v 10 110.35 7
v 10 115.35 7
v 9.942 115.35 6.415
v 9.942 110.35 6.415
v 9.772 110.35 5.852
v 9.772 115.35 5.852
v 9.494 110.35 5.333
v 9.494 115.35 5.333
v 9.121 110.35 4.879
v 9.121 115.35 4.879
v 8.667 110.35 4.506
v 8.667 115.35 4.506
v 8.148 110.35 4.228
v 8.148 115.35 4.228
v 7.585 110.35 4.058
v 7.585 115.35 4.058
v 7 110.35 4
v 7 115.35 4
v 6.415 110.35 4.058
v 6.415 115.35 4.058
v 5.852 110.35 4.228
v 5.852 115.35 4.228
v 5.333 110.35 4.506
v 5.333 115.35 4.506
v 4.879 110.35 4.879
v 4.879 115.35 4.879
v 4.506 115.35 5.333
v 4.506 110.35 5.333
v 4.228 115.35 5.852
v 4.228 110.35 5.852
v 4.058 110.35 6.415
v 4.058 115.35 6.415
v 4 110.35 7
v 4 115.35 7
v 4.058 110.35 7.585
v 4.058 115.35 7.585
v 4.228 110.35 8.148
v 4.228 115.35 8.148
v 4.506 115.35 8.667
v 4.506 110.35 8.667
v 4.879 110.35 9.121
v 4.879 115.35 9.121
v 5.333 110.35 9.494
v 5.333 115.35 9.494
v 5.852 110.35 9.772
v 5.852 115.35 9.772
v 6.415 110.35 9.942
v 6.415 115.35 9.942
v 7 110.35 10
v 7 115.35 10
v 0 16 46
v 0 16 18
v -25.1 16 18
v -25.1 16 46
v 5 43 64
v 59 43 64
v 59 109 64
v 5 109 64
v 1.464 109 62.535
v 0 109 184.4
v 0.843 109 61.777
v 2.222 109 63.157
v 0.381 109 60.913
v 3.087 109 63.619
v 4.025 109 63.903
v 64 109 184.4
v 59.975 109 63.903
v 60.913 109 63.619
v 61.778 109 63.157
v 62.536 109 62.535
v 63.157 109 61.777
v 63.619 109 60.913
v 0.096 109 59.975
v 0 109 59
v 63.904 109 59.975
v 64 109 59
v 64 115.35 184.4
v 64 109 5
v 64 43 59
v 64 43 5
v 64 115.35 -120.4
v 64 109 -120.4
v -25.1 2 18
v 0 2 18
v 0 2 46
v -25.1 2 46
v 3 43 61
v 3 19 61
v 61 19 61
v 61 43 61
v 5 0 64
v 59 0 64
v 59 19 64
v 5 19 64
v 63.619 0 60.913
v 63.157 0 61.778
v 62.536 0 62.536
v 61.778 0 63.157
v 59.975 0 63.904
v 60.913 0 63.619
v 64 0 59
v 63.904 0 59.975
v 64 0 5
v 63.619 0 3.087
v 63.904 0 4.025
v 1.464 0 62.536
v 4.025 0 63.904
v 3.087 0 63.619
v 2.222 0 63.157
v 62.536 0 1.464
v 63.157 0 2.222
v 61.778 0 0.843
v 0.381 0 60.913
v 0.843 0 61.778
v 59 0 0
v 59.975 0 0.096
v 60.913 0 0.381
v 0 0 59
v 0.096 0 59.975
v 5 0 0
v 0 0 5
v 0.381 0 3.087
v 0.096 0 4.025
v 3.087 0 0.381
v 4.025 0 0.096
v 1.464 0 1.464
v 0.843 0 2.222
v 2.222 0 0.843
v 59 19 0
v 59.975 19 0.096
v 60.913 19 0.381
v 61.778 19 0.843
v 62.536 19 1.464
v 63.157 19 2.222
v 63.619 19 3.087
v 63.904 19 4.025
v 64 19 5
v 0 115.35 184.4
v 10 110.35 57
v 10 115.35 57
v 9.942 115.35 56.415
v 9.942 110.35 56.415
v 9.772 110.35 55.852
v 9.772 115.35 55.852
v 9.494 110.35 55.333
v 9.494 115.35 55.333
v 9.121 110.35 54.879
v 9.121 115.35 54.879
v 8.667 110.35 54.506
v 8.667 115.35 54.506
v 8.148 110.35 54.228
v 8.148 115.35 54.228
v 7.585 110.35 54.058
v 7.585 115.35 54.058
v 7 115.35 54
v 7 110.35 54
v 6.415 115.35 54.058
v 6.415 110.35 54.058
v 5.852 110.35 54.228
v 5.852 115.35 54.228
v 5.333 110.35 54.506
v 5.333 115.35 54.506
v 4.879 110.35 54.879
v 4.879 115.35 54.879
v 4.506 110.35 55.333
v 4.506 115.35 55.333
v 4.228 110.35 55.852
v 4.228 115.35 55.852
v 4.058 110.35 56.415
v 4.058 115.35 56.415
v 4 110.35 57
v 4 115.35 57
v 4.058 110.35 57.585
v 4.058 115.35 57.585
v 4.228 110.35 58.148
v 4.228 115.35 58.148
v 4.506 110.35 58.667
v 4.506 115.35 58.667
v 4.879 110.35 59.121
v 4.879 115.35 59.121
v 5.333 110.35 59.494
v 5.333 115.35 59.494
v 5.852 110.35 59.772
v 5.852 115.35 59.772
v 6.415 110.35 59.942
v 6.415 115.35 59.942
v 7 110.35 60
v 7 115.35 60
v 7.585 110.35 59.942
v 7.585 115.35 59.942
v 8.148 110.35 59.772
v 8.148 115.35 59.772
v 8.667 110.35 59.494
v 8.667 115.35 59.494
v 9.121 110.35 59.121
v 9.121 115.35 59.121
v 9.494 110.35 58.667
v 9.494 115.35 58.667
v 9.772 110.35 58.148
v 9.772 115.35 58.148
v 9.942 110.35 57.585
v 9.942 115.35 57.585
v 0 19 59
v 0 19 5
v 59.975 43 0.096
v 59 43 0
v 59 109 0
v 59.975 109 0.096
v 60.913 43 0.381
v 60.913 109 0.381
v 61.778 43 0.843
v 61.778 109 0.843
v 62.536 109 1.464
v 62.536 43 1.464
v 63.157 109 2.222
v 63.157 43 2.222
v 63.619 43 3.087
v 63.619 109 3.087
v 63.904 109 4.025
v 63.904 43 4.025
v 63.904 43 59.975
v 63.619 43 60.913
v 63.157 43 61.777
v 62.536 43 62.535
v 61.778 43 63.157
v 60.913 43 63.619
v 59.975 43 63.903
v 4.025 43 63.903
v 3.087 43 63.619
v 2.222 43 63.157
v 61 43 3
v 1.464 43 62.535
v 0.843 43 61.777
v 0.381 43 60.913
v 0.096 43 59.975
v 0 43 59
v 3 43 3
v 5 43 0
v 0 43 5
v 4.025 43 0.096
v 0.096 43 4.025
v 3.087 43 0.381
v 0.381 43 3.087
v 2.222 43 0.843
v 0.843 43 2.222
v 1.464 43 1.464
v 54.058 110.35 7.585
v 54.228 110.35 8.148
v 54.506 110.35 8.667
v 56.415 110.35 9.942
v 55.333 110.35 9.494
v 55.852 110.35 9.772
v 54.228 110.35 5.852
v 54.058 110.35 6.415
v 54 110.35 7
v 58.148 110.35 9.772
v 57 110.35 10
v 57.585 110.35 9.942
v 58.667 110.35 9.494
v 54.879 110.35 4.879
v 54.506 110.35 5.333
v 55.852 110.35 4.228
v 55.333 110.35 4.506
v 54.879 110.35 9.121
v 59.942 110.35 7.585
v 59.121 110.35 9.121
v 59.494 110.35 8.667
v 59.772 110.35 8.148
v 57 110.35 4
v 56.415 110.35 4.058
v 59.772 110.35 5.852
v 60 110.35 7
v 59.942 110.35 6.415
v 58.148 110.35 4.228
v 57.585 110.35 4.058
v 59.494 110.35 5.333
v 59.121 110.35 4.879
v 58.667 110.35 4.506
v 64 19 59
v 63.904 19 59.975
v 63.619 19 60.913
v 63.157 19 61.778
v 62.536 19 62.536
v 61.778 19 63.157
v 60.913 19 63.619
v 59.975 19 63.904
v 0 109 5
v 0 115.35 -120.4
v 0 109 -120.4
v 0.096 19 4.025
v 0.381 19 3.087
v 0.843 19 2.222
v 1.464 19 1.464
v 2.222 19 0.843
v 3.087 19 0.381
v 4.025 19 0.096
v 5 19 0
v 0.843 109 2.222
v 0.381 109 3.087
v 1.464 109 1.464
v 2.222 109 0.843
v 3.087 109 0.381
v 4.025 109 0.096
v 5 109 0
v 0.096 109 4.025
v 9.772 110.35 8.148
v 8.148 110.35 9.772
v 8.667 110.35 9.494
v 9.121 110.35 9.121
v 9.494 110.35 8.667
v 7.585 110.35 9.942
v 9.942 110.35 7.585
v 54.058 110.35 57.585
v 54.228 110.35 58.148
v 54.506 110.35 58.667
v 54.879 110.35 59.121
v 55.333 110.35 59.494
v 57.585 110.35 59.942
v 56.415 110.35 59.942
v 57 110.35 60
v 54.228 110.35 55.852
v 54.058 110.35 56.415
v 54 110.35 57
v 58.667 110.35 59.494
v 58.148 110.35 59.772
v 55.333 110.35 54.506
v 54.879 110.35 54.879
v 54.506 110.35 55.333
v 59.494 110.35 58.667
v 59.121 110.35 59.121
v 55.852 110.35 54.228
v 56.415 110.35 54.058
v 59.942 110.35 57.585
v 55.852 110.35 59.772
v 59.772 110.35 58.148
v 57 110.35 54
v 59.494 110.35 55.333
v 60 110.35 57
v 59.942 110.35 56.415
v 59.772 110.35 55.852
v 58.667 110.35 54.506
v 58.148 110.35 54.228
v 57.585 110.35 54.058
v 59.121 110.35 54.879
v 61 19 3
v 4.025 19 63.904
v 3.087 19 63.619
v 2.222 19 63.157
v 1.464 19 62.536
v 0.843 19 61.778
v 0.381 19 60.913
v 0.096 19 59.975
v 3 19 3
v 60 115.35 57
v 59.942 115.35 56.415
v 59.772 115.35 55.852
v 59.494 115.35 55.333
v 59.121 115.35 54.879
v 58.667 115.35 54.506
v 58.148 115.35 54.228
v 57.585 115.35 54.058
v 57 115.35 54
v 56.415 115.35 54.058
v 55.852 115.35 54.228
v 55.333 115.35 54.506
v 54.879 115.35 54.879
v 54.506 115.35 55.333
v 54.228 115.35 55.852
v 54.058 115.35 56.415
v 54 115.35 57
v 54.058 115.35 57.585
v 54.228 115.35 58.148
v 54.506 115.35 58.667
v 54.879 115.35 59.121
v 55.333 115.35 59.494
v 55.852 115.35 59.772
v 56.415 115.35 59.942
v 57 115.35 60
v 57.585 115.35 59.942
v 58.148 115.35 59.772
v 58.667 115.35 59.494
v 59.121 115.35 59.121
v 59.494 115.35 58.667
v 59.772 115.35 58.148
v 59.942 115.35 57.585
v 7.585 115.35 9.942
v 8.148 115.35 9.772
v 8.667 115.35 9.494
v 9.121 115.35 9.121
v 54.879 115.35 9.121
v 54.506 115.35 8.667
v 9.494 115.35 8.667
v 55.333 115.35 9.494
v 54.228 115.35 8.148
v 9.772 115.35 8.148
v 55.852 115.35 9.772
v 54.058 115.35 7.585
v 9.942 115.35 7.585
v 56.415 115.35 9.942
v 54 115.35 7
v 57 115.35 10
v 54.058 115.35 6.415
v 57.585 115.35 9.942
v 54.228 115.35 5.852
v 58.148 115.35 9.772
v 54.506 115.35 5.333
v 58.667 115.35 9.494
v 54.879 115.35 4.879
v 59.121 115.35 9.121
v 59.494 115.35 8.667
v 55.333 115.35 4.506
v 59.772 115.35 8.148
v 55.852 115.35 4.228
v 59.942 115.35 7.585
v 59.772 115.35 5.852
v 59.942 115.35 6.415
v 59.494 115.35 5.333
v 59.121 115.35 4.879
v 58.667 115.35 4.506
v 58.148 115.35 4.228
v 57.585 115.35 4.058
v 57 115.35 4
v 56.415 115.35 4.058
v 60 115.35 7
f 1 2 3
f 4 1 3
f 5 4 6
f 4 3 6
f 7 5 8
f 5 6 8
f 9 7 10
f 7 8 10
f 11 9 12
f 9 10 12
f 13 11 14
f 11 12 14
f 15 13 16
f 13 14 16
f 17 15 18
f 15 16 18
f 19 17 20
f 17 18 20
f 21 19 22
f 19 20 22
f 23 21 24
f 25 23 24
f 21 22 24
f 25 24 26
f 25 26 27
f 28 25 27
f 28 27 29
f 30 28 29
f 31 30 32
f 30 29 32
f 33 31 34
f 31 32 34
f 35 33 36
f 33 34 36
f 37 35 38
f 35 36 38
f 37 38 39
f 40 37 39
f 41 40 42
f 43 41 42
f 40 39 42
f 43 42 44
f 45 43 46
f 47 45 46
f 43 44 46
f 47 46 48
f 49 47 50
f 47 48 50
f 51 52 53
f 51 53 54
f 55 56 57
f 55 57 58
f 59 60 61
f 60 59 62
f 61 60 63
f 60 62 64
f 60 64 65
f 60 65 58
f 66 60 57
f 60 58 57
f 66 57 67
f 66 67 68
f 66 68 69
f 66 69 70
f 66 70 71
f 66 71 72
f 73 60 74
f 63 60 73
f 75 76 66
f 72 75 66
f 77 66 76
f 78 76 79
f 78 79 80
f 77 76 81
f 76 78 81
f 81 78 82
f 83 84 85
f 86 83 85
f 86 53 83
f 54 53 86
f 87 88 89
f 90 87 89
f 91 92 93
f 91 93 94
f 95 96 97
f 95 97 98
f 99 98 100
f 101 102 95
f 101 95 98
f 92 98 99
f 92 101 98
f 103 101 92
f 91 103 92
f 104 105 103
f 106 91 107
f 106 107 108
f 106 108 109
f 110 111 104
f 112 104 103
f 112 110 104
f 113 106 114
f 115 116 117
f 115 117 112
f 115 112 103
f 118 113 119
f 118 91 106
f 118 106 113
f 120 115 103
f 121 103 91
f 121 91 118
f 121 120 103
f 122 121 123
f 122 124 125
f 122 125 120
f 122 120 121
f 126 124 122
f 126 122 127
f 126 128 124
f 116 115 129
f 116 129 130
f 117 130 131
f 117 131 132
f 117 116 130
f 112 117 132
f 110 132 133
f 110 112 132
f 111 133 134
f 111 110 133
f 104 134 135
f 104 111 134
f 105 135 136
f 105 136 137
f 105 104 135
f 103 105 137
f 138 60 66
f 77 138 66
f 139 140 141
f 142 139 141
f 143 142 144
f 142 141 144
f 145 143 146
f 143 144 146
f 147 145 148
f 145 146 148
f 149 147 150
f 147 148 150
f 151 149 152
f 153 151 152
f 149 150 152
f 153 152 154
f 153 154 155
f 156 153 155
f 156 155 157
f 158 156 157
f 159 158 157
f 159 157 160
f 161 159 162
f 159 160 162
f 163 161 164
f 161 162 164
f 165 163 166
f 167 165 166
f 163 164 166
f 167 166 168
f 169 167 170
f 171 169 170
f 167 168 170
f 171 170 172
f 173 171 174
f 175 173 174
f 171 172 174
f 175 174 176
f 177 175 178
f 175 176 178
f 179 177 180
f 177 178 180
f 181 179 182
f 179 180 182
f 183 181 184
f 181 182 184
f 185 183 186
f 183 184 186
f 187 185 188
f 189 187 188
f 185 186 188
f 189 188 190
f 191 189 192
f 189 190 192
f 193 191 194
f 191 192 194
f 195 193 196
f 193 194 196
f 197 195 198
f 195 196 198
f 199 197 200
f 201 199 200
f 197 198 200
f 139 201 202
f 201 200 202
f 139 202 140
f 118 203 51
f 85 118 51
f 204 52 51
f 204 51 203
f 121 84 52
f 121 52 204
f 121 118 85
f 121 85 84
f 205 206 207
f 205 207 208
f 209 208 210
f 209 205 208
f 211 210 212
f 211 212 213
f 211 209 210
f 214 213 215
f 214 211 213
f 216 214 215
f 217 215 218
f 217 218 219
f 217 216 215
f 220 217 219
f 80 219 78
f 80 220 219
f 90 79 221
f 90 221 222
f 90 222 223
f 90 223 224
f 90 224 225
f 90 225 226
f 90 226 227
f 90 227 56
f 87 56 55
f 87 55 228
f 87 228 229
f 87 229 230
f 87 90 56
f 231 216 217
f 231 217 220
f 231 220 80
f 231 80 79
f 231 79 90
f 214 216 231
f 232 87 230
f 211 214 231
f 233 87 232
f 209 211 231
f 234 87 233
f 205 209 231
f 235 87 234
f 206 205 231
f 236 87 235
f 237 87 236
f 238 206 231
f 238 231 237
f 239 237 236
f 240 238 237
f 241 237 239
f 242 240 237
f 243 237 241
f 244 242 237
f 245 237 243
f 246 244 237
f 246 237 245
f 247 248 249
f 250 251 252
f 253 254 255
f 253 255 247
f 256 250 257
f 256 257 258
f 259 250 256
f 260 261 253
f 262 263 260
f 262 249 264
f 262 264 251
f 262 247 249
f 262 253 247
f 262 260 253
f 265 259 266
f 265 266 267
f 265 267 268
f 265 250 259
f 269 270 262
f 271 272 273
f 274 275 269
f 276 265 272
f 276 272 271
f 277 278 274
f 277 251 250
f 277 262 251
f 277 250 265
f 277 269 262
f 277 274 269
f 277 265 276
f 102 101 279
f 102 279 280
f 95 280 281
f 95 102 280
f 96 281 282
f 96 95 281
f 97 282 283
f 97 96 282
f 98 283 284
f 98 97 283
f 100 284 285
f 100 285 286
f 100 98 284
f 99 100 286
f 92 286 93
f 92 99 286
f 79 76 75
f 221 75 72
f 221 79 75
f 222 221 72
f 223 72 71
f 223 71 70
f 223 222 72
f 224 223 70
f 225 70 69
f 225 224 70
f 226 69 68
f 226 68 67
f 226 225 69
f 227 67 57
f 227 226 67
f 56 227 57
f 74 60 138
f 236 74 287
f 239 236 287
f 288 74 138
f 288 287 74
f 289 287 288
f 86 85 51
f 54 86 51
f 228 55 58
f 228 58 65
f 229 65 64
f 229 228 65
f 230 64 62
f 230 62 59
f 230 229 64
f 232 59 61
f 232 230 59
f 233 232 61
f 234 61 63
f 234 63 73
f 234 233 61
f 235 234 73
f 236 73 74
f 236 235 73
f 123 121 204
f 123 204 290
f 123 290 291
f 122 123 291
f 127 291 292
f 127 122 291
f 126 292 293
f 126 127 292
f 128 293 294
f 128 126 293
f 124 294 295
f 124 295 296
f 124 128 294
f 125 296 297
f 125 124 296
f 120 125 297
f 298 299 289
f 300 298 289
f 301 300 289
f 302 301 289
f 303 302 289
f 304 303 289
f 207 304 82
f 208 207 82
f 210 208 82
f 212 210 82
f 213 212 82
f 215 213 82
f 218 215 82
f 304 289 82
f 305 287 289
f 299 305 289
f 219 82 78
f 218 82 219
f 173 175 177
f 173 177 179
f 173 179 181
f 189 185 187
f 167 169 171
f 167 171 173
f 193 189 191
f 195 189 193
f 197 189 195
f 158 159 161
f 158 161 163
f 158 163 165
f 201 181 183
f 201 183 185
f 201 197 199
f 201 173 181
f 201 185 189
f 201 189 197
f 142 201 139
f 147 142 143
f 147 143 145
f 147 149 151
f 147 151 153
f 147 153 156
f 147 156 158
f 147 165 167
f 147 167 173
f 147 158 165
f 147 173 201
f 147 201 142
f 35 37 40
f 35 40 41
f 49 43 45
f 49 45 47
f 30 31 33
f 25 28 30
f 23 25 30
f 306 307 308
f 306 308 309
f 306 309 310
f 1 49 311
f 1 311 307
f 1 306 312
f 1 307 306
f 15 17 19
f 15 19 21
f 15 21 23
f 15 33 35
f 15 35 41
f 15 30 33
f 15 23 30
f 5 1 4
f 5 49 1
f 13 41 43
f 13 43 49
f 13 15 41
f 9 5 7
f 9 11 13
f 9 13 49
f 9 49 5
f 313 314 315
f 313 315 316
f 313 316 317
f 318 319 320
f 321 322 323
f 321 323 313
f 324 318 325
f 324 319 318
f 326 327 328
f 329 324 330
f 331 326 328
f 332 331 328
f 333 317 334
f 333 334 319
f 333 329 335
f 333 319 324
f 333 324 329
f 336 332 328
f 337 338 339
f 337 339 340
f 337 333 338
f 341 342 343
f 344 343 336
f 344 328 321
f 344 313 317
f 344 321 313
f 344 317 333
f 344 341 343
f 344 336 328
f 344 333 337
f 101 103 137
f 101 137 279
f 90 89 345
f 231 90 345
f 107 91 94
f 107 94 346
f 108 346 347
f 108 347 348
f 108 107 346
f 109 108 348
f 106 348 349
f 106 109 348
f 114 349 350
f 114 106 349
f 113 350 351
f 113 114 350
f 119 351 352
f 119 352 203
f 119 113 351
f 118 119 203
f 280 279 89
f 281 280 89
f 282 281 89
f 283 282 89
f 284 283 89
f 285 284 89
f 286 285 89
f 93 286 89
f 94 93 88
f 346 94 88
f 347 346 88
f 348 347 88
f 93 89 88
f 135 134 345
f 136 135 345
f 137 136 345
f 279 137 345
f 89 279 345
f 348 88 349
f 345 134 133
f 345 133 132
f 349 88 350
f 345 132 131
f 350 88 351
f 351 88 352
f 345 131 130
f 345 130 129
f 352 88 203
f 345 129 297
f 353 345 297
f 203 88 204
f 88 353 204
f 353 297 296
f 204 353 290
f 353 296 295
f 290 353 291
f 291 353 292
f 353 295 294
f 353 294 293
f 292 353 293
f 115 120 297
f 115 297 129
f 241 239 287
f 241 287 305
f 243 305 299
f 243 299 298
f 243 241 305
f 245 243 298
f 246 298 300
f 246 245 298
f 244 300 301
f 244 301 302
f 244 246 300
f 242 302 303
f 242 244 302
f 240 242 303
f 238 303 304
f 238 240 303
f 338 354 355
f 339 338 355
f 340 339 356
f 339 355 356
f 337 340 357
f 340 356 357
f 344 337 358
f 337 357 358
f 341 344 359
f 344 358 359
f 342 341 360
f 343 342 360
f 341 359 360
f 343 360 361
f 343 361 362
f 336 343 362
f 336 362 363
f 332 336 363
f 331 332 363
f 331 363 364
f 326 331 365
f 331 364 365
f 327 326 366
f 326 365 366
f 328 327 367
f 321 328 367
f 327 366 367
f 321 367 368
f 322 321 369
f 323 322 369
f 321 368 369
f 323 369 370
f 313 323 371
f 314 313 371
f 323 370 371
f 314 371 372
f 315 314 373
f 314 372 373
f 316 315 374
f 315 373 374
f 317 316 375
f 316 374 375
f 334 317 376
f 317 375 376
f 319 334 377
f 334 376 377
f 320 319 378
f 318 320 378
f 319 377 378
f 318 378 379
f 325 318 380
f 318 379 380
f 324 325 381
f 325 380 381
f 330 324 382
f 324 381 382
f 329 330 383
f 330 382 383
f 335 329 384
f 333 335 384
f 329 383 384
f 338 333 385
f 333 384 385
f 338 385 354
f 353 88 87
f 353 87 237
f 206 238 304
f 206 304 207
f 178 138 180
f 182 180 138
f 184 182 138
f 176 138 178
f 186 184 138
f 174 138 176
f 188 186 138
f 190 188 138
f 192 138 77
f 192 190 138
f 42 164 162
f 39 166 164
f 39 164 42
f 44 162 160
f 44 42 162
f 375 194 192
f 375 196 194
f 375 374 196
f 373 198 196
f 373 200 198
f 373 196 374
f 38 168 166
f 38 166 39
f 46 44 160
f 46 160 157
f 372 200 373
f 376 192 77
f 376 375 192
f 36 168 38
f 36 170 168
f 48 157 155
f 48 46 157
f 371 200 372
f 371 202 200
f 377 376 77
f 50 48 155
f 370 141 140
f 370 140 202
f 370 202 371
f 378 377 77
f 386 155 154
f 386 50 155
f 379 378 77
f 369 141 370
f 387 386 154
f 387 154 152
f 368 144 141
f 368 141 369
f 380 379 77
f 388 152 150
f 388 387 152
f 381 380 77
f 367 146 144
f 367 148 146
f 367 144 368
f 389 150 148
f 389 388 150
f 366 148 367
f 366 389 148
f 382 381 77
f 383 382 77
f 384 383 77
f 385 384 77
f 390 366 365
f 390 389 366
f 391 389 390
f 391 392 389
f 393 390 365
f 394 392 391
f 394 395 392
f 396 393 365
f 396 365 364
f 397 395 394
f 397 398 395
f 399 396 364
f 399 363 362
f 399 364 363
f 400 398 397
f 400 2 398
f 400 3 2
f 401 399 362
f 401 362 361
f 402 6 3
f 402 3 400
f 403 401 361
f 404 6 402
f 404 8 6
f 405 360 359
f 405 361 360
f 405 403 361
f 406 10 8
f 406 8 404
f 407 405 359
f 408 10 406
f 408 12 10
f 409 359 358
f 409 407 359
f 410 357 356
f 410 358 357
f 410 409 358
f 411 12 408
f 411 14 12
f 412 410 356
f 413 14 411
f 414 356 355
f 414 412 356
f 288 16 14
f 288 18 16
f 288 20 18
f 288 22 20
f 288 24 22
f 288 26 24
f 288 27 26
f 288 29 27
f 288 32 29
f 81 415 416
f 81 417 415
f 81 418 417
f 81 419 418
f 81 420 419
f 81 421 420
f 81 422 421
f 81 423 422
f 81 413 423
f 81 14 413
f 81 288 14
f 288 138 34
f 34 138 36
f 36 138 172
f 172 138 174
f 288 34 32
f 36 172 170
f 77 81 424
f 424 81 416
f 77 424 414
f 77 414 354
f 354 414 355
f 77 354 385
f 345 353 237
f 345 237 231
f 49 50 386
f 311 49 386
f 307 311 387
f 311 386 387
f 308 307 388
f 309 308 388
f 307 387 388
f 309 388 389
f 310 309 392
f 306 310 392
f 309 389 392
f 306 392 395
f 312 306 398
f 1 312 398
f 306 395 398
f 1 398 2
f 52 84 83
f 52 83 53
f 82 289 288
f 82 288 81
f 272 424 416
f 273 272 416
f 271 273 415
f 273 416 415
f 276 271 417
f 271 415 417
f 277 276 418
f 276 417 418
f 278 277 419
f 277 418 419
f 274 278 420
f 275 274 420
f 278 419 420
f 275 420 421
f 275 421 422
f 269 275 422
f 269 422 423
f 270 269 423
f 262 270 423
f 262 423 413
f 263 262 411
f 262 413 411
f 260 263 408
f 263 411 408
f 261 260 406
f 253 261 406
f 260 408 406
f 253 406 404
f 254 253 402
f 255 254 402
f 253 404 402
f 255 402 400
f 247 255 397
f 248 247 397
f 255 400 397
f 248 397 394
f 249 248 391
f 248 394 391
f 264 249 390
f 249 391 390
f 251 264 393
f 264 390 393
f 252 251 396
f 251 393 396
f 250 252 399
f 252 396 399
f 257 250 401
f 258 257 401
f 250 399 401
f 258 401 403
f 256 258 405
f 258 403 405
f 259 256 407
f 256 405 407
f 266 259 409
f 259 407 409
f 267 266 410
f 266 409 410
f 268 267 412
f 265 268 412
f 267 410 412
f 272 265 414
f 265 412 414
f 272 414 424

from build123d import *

# Parameters (mm, degrees)
BOSS_EXTRUDE1_DEPTH = 19
SKETCH3_W           = 58
SKETCH3_H           = 58
BOSS_EXTRUDE2_DEPTH = 24
BOSS_EXTRUDE3_DEPTH = 66
SKETCH6_W           = 28
SKETCH6_H           = 14
BOSS_EXTRUDE4_DEPTH = 25.1
SKETCH7_W           = 64
SKETCH7_H           = 304.8
BOSS_EXTRUDE5_DEPTH = 6.35
SKETCH8_R           = 3
CUT_EXTRUDE1_DEPTH  = 5


with BuildPart() as part:
    # Sketch2 → Boss-Extrude1 (new body)
    with BuildSketch(Plane(origin=(0, 0, 0), x_dir=(1, 0, 0), z_dir=(0, 1, 0))):
        with BuildLine():
            Line((5, 0), (59, 0))
            ThreePointArc((59, 0), (62.535533906, -1.464466094), (64, -5))
            Line((64, -5), (64, -59))
            ThreePointArc((64, -59), (62.535533906, -62.535533906), (59, -64))
            Line((59, -64), (5, -64))
            ThreePointArc((5, -64), (1.464466094, -62.535533906), (0, -59))
            Line((0, -59), (0, -5))
            ThreePointArc((0, -5), (1.464466094, -1.464466094), (5, 0))
        make_face()
    extrude(amount=BOSS_EXTRUDE1_DEPTH)

    # Sketch3 → Boss-Extrude2 (add)
    with BuildSketch(Plane(origin=(0, 19, 0), x_dir=(1, 0, 0), z_dir=(0, 1, 0))):
        with Locations((32, -32)):
            Rectangle(SKETCH3_W, SKETCH3_H)
    extrude(amount=BOSS_EXTRUDE2_DEPTH)

    # Sketch4 → Boss-Extrude3 (add)
    with BuildSketch(Plane(origin=(0, 43, 0), x_dir=(1, 0, 0), z_dir=(0, 1, 0))):
        with BuildLine():
            Line((5, 0), (59, 0))
            ThreePointArc((59, 0), (62.535533906, -1.464466094), (64, -5))
            Line((64, -5), (64, -58.999541839))
            ThreePointArc((64, -58.999541839), (62.535533906, -62.535075745), (59, -63.999541839))
            Line((59, -63.999541839), (5, -63.999541839))
            ThreePointArc((5, -63.999541839), (1.464466094, -62.535075745), (0, -58.999541839))
            Line((0, -58.999541839), (0, -5))
            ThreePointArc((0, -5), (1.464466094, -1.464466094), (5, 0))
        make_face()
    extrude(amount=BOSS_EXTRUDE3_DEPTH)

    # Sketch6 → Boss-Extrude4 (add)
    with BuildSketch(Plane.ZY):
        with Locations((32, 9)):
            Rectangle(SKETCH6_W, SKETCH6_H)
    extrude(amount=BOSS_EXTRUDE4_DEPTH)

    # Sketch7 → Boss-Extrude5 (add)
    with BuildSketch(Plane(origin=(0, 109, 0), x_dir=(1, 0, 0), z_dir=(0, 1, 0))):
        with Locations((32, -32)):
            Rectangle(SKETCH7_W, SKETCH7_H)
    extrude(amount=BOSS_EXTRUDE5_DEPTH)

    # Sketch8 → Cut-Extrude1 (cut)
    with BuildSketch(Plane(origin=(0, 115.35, 0), x_dir=(1, 0, 0), z_dir=(0, 1, 0))):
        with BuildLine():
            ThreePointArc((7, -10), (9.121320344, -9.121320344), (10, -7))
            Line((10, -7), (7, -7))
            Line((7, -7), (7, -10))
        make_face()
        with BuildLine():
            Line((7, -7), (10, -7))
            ThreePointArc((10, -7), (4.878679656, -4.878679656), (7, -10))
            Line((7, -10), (7, -7))
        make_face()
        with Locations((57, -7)):
            Circle(SKETCH8_R)
        with Locations((57, -57)):
            Circle(SKETCH8_R)
        with Locations((7, -57)):
            Circle(SKETCH8_R)
    extrude(amount=-CUT_EXTRUDE1_DEPTH, mode=Mode.SUBTRACT)


solid = part.part
